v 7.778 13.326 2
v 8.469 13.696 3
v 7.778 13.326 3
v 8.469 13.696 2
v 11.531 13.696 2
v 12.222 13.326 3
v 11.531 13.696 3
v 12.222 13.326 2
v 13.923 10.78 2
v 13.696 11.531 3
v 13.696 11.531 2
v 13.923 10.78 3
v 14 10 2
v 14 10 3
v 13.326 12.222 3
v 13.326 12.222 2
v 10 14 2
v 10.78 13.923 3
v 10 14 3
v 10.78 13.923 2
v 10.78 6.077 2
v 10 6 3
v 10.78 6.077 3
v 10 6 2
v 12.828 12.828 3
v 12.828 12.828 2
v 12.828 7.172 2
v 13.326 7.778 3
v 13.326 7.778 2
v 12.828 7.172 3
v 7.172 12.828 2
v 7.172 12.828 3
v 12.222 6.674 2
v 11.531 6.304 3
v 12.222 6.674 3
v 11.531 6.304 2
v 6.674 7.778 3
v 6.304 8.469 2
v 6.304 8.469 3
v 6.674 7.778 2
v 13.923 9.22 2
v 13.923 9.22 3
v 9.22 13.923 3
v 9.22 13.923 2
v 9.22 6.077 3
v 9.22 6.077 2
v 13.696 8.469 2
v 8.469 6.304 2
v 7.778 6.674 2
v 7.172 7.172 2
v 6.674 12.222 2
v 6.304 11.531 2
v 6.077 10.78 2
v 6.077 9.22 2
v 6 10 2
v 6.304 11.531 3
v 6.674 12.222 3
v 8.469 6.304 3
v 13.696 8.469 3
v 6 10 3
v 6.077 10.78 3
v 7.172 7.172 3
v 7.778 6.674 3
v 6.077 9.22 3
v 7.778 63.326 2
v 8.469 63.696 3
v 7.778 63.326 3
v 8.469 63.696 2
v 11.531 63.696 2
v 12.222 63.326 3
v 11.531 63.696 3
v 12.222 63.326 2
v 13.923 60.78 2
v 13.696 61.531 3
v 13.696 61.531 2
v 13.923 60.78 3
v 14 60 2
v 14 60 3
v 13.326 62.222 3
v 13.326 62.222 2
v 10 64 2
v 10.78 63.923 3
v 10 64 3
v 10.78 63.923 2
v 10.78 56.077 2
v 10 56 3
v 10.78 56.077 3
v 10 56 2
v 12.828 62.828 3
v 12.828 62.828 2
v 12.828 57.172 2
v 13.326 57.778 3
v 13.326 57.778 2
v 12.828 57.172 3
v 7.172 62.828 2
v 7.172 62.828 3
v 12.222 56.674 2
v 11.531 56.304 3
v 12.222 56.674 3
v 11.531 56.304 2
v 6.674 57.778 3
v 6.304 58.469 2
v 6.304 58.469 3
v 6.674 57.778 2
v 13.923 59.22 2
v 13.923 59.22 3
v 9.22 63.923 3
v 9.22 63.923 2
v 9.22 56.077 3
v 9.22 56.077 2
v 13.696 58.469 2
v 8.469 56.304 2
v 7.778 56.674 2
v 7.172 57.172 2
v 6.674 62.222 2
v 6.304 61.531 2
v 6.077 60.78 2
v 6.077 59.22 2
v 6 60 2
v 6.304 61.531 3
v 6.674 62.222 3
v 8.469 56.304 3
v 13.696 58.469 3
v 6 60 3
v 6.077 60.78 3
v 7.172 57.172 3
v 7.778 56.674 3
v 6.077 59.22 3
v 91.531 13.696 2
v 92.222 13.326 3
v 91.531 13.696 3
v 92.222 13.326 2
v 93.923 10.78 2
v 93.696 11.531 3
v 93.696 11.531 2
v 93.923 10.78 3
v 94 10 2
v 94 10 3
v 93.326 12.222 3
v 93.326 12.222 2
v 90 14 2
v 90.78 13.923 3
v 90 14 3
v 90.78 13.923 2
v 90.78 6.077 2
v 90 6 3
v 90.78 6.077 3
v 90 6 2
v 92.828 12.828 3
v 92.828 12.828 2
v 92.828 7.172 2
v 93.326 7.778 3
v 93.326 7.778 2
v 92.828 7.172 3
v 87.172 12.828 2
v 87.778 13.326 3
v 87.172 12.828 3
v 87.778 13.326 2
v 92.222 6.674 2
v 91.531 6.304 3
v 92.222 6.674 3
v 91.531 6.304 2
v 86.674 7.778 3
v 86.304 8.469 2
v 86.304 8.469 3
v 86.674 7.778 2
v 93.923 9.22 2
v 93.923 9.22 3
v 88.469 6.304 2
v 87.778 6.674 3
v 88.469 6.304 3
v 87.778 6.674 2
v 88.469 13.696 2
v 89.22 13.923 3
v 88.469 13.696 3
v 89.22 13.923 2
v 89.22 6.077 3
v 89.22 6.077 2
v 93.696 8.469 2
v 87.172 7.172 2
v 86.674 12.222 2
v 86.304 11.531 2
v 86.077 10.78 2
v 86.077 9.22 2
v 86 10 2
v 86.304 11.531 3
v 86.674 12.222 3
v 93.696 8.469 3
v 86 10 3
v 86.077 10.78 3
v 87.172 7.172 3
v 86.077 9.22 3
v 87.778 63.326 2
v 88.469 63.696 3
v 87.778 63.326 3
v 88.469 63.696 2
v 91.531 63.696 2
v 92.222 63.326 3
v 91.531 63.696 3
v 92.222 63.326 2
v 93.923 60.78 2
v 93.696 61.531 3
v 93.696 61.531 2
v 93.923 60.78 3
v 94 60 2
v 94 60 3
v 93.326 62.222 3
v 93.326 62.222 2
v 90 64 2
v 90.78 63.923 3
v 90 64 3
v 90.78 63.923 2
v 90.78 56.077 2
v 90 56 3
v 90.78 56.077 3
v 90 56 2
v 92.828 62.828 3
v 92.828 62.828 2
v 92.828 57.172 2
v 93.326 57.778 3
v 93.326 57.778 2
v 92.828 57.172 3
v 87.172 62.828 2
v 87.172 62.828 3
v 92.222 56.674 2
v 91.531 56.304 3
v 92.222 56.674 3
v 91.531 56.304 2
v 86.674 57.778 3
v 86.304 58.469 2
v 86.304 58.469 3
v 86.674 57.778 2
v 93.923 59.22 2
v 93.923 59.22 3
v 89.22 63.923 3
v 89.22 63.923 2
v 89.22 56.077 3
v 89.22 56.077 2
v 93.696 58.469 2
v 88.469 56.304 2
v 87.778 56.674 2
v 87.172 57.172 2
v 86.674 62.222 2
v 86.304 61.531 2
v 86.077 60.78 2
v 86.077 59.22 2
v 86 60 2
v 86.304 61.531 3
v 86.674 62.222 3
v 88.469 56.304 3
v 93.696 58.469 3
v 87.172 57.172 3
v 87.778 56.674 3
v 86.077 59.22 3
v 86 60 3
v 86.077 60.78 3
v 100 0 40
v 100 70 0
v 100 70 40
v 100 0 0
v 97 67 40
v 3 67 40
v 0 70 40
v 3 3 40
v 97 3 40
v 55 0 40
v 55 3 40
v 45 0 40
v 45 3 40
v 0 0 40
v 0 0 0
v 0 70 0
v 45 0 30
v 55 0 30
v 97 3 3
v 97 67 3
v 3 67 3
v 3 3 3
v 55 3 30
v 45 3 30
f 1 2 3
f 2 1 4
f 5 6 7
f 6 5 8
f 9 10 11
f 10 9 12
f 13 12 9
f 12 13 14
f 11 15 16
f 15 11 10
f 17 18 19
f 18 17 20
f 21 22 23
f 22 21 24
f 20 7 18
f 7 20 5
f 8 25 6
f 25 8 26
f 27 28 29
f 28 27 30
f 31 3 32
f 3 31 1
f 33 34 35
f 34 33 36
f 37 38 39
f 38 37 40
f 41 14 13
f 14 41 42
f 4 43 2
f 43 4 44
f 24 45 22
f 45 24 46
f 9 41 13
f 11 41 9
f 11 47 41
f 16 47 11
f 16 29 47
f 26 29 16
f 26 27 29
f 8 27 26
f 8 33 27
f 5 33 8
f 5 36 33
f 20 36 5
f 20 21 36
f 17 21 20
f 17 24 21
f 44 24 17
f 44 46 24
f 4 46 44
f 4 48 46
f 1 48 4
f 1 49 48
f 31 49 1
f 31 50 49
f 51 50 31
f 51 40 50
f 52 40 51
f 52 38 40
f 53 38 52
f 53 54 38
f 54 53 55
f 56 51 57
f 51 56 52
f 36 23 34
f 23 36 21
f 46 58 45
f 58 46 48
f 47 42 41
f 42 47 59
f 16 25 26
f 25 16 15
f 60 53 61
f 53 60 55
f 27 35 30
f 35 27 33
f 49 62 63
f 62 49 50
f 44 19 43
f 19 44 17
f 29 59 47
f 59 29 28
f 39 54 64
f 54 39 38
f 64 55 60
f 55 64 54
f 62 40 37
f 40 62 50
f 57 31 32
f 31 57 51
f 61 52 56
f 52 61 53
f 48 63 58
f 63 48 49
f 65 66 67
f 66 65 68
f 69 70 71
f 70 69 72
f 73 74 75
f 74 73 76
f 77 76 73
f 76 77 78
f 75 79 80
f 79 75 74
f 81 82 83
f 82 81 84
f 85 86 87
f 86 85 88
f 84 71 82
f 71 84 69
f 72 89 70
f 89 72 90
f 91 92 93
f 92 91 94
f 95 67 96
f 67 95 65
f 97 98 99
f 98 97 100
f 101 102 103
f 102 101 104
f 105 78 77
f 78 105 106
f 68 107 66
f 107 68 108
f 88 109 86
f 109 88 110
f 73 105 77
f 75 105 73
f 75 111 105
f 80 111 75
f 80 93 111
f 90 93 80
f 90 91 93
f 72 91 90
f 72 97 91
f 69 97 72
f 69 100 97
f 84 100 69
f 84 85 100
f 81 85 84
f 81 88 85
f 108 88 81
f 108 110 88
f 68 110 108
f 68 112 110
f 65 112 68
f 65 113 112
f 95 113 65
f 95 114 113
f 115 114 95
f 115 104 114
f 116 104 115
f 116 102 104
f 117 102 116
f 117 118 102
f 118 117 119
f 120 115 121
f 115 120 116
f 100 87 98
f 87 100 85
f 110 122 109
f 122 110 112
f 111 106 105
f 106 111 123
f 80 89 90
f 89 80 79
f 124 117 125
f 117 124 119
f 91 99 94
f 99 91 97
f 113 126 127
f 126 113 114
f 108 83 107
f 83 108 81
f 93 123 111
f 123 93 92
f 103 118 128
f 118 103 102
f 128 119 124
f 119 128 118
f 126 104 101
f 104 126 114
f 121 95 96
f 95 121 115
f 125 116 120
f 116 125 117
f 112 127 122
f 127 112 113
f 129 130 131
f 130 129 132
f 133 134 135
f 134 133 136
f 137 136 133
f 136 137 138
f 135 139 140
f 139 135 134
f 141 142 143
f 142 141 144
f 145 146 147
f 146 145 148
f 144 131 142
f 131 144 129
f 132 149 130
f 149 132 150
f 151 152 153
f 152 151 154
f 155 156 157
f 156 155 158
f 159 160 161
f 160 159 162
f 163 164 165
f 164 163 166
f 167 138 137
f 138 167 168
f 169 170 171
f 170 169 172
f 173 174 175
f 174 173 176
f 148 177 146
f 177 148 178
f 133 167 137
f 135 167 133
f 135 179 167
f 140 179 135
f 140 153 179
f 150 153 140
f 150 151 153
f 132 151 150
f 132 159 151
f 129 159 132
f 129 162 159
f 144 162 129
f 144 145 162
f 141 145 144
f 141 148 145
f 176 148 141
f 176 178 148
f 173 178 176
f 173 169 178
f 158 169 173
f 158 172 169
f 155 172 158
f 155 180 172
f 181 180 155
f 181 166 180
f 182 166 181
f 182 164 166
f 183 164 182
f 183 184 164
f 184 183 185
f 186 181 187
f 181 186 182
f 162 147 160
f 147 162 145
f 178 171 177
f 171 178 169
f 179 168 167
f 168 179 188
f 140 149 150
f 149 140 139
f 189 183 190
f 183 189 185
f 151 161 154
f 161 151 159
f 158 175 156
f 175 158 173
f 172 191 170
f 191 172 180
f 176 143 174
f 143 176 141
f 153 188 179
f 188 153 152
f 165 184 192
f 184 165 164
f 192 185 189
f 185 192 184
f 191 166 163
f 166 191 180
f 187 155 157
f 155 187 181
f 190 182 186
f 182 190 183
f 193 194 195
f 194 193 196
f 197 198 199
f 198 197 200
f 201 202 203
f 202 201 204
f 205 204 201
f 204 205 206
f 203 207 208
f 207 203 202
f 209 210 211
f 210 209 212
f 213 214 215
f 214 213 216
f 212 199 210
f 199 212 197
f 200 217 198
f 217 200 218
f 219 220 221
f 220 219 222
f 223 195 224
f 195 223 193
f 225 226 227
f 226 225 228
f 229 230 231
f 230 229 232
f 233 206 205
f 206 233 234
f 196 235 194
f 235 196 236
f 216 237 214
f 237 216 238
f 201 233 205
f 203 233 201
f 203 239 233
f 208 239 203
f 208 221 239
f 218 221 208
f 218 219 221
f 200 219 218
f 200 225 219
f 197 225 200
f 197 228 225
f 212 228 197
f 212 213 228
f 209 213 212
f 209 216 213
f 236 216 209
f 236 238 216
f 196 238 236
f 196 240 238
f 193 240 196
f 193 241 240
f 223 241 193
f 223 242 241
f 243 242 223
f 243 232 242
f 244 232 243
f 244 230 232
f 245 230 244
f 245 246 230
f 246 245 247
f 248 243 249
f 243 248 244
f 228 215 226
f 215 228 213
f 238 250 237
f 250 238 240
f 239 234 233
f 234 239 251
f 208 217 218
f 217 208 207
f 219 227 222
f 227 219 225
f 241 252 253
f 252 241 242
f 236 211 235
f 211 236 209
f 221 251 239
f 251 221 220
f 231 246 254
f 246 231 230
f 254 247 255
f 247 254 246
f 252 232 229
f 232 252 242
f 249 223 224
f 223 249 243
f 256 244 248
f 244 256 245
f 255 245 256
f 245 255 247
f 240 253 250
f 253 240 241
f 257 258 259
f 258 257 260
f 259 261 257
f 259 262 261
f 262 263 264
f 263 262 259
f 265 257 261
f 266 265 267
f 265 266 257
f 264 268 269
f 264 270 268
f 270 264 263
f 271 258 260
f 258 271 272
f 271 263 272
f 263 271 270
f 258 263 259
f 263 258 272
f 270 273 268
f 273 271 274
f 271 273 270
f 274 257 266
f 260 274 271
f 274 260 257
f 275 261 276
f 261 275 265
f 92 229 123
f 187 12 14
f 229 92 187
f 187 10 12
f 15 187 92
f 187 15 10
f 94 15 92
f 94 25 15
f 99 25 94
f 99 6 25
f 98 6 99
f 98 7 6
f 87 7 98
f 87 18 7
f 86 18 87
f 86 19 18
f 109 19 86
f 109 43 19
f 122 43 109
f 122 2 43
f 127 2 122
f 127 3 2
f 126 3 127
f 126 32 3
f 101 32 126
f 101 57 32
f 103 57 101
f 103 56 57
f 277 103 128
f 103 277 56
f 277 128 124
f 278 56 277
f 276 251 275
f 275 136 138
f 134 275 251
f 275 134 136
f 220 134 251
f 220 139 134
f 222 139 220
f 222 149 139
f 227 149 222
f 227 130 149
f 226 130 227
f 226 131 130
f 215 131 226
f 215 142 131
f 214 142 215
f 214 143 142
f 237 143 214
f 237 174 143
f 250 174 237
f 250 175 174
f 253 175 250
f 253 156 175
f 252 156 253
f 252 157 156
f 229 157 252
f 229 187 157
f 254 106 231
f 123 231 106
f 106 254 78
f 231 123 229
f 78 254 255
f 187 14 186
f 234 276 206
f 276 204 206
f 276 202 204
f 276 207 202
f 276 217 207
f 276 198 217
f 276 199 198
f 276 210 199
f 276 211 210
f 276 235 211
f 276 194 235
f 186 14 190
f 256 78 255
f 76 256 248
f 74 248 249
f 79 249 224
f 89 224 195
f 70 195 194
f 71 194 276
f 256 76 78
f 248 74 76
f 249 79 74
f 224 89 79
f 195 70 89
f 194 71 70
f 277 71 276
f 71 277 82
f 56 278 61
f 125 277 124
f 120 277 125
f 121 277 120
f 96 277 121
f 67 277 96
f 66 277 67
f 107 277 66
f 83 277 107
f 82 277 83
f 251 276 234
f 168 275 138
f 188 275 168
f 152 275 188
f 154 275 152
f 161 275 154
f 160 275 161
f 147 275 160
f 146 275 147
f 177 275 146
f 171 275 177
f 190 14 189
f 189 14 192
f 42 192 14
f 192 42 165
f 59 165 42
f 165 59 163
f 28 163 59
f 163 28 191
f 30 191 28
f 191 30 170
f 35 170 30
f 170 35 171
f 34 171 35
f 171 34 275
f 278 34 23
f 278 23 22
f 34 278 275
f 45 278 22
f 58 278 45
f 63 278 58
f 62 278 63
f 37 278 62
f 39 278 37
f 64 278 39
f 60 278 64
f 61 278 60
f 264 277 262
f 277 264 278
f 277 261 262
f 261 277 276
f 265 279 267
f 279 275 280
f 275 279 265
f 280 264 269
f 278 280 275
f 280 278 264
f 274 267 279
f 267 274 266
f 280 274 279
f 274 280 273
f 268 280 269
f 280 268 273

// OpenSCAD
$fn = 32;

// ----------------------------------------------------------------------
// Enclosure box: both enclosure
// ----------------------------------------------------------------------

// --- parameters (mm) ---
box_l = 100;              // outer length, X
box_w = 70;               // outer width, Y
box_h = 40;               // outer height
wall_t = 3;               // wall thickness
boss_r = 4;               // corner boss radius
hole_r = 1.5;             // boss screw hole radius
boss_in = 10;             // boss inset from the corners
notch_w = 10;             // cable notch width
notch_h = 10;             // cable notch height
fit_tol = 0.1;            // tolerance for press fits, mm
free_tol = 0.3;           // tolerance for clearance fits, mm

inner_h = box_h - wall_t;  // cavity depth
boss_h = inner_h - 2;  // corner boss height

difference() {
  cube([box_l, box_w, box_h]);
  translate([wall_t, wall_t, wall_t])
    cube([box_l - 2 * wall_t, box_w - 2 * wall_t, box_h]);
  for (sx = [0, 1], sy = [0, 1])
    translate([sx ? box_l - boss_in : boss_in,
               sy ? box_w - boss_in : boss_in, wall_t - 1]) {
      cylinder(r = boss_r, h = boss_h);
      translate([0, 0, boss_h - 4])
        cylinder(r = hole_r, h = 5);
    }
  translate([box_l / 2 - notch_w / 2, -1, box_h - notch_h])
    cube([notch_w, wall_t + 2, notch_h + 1]);
}
